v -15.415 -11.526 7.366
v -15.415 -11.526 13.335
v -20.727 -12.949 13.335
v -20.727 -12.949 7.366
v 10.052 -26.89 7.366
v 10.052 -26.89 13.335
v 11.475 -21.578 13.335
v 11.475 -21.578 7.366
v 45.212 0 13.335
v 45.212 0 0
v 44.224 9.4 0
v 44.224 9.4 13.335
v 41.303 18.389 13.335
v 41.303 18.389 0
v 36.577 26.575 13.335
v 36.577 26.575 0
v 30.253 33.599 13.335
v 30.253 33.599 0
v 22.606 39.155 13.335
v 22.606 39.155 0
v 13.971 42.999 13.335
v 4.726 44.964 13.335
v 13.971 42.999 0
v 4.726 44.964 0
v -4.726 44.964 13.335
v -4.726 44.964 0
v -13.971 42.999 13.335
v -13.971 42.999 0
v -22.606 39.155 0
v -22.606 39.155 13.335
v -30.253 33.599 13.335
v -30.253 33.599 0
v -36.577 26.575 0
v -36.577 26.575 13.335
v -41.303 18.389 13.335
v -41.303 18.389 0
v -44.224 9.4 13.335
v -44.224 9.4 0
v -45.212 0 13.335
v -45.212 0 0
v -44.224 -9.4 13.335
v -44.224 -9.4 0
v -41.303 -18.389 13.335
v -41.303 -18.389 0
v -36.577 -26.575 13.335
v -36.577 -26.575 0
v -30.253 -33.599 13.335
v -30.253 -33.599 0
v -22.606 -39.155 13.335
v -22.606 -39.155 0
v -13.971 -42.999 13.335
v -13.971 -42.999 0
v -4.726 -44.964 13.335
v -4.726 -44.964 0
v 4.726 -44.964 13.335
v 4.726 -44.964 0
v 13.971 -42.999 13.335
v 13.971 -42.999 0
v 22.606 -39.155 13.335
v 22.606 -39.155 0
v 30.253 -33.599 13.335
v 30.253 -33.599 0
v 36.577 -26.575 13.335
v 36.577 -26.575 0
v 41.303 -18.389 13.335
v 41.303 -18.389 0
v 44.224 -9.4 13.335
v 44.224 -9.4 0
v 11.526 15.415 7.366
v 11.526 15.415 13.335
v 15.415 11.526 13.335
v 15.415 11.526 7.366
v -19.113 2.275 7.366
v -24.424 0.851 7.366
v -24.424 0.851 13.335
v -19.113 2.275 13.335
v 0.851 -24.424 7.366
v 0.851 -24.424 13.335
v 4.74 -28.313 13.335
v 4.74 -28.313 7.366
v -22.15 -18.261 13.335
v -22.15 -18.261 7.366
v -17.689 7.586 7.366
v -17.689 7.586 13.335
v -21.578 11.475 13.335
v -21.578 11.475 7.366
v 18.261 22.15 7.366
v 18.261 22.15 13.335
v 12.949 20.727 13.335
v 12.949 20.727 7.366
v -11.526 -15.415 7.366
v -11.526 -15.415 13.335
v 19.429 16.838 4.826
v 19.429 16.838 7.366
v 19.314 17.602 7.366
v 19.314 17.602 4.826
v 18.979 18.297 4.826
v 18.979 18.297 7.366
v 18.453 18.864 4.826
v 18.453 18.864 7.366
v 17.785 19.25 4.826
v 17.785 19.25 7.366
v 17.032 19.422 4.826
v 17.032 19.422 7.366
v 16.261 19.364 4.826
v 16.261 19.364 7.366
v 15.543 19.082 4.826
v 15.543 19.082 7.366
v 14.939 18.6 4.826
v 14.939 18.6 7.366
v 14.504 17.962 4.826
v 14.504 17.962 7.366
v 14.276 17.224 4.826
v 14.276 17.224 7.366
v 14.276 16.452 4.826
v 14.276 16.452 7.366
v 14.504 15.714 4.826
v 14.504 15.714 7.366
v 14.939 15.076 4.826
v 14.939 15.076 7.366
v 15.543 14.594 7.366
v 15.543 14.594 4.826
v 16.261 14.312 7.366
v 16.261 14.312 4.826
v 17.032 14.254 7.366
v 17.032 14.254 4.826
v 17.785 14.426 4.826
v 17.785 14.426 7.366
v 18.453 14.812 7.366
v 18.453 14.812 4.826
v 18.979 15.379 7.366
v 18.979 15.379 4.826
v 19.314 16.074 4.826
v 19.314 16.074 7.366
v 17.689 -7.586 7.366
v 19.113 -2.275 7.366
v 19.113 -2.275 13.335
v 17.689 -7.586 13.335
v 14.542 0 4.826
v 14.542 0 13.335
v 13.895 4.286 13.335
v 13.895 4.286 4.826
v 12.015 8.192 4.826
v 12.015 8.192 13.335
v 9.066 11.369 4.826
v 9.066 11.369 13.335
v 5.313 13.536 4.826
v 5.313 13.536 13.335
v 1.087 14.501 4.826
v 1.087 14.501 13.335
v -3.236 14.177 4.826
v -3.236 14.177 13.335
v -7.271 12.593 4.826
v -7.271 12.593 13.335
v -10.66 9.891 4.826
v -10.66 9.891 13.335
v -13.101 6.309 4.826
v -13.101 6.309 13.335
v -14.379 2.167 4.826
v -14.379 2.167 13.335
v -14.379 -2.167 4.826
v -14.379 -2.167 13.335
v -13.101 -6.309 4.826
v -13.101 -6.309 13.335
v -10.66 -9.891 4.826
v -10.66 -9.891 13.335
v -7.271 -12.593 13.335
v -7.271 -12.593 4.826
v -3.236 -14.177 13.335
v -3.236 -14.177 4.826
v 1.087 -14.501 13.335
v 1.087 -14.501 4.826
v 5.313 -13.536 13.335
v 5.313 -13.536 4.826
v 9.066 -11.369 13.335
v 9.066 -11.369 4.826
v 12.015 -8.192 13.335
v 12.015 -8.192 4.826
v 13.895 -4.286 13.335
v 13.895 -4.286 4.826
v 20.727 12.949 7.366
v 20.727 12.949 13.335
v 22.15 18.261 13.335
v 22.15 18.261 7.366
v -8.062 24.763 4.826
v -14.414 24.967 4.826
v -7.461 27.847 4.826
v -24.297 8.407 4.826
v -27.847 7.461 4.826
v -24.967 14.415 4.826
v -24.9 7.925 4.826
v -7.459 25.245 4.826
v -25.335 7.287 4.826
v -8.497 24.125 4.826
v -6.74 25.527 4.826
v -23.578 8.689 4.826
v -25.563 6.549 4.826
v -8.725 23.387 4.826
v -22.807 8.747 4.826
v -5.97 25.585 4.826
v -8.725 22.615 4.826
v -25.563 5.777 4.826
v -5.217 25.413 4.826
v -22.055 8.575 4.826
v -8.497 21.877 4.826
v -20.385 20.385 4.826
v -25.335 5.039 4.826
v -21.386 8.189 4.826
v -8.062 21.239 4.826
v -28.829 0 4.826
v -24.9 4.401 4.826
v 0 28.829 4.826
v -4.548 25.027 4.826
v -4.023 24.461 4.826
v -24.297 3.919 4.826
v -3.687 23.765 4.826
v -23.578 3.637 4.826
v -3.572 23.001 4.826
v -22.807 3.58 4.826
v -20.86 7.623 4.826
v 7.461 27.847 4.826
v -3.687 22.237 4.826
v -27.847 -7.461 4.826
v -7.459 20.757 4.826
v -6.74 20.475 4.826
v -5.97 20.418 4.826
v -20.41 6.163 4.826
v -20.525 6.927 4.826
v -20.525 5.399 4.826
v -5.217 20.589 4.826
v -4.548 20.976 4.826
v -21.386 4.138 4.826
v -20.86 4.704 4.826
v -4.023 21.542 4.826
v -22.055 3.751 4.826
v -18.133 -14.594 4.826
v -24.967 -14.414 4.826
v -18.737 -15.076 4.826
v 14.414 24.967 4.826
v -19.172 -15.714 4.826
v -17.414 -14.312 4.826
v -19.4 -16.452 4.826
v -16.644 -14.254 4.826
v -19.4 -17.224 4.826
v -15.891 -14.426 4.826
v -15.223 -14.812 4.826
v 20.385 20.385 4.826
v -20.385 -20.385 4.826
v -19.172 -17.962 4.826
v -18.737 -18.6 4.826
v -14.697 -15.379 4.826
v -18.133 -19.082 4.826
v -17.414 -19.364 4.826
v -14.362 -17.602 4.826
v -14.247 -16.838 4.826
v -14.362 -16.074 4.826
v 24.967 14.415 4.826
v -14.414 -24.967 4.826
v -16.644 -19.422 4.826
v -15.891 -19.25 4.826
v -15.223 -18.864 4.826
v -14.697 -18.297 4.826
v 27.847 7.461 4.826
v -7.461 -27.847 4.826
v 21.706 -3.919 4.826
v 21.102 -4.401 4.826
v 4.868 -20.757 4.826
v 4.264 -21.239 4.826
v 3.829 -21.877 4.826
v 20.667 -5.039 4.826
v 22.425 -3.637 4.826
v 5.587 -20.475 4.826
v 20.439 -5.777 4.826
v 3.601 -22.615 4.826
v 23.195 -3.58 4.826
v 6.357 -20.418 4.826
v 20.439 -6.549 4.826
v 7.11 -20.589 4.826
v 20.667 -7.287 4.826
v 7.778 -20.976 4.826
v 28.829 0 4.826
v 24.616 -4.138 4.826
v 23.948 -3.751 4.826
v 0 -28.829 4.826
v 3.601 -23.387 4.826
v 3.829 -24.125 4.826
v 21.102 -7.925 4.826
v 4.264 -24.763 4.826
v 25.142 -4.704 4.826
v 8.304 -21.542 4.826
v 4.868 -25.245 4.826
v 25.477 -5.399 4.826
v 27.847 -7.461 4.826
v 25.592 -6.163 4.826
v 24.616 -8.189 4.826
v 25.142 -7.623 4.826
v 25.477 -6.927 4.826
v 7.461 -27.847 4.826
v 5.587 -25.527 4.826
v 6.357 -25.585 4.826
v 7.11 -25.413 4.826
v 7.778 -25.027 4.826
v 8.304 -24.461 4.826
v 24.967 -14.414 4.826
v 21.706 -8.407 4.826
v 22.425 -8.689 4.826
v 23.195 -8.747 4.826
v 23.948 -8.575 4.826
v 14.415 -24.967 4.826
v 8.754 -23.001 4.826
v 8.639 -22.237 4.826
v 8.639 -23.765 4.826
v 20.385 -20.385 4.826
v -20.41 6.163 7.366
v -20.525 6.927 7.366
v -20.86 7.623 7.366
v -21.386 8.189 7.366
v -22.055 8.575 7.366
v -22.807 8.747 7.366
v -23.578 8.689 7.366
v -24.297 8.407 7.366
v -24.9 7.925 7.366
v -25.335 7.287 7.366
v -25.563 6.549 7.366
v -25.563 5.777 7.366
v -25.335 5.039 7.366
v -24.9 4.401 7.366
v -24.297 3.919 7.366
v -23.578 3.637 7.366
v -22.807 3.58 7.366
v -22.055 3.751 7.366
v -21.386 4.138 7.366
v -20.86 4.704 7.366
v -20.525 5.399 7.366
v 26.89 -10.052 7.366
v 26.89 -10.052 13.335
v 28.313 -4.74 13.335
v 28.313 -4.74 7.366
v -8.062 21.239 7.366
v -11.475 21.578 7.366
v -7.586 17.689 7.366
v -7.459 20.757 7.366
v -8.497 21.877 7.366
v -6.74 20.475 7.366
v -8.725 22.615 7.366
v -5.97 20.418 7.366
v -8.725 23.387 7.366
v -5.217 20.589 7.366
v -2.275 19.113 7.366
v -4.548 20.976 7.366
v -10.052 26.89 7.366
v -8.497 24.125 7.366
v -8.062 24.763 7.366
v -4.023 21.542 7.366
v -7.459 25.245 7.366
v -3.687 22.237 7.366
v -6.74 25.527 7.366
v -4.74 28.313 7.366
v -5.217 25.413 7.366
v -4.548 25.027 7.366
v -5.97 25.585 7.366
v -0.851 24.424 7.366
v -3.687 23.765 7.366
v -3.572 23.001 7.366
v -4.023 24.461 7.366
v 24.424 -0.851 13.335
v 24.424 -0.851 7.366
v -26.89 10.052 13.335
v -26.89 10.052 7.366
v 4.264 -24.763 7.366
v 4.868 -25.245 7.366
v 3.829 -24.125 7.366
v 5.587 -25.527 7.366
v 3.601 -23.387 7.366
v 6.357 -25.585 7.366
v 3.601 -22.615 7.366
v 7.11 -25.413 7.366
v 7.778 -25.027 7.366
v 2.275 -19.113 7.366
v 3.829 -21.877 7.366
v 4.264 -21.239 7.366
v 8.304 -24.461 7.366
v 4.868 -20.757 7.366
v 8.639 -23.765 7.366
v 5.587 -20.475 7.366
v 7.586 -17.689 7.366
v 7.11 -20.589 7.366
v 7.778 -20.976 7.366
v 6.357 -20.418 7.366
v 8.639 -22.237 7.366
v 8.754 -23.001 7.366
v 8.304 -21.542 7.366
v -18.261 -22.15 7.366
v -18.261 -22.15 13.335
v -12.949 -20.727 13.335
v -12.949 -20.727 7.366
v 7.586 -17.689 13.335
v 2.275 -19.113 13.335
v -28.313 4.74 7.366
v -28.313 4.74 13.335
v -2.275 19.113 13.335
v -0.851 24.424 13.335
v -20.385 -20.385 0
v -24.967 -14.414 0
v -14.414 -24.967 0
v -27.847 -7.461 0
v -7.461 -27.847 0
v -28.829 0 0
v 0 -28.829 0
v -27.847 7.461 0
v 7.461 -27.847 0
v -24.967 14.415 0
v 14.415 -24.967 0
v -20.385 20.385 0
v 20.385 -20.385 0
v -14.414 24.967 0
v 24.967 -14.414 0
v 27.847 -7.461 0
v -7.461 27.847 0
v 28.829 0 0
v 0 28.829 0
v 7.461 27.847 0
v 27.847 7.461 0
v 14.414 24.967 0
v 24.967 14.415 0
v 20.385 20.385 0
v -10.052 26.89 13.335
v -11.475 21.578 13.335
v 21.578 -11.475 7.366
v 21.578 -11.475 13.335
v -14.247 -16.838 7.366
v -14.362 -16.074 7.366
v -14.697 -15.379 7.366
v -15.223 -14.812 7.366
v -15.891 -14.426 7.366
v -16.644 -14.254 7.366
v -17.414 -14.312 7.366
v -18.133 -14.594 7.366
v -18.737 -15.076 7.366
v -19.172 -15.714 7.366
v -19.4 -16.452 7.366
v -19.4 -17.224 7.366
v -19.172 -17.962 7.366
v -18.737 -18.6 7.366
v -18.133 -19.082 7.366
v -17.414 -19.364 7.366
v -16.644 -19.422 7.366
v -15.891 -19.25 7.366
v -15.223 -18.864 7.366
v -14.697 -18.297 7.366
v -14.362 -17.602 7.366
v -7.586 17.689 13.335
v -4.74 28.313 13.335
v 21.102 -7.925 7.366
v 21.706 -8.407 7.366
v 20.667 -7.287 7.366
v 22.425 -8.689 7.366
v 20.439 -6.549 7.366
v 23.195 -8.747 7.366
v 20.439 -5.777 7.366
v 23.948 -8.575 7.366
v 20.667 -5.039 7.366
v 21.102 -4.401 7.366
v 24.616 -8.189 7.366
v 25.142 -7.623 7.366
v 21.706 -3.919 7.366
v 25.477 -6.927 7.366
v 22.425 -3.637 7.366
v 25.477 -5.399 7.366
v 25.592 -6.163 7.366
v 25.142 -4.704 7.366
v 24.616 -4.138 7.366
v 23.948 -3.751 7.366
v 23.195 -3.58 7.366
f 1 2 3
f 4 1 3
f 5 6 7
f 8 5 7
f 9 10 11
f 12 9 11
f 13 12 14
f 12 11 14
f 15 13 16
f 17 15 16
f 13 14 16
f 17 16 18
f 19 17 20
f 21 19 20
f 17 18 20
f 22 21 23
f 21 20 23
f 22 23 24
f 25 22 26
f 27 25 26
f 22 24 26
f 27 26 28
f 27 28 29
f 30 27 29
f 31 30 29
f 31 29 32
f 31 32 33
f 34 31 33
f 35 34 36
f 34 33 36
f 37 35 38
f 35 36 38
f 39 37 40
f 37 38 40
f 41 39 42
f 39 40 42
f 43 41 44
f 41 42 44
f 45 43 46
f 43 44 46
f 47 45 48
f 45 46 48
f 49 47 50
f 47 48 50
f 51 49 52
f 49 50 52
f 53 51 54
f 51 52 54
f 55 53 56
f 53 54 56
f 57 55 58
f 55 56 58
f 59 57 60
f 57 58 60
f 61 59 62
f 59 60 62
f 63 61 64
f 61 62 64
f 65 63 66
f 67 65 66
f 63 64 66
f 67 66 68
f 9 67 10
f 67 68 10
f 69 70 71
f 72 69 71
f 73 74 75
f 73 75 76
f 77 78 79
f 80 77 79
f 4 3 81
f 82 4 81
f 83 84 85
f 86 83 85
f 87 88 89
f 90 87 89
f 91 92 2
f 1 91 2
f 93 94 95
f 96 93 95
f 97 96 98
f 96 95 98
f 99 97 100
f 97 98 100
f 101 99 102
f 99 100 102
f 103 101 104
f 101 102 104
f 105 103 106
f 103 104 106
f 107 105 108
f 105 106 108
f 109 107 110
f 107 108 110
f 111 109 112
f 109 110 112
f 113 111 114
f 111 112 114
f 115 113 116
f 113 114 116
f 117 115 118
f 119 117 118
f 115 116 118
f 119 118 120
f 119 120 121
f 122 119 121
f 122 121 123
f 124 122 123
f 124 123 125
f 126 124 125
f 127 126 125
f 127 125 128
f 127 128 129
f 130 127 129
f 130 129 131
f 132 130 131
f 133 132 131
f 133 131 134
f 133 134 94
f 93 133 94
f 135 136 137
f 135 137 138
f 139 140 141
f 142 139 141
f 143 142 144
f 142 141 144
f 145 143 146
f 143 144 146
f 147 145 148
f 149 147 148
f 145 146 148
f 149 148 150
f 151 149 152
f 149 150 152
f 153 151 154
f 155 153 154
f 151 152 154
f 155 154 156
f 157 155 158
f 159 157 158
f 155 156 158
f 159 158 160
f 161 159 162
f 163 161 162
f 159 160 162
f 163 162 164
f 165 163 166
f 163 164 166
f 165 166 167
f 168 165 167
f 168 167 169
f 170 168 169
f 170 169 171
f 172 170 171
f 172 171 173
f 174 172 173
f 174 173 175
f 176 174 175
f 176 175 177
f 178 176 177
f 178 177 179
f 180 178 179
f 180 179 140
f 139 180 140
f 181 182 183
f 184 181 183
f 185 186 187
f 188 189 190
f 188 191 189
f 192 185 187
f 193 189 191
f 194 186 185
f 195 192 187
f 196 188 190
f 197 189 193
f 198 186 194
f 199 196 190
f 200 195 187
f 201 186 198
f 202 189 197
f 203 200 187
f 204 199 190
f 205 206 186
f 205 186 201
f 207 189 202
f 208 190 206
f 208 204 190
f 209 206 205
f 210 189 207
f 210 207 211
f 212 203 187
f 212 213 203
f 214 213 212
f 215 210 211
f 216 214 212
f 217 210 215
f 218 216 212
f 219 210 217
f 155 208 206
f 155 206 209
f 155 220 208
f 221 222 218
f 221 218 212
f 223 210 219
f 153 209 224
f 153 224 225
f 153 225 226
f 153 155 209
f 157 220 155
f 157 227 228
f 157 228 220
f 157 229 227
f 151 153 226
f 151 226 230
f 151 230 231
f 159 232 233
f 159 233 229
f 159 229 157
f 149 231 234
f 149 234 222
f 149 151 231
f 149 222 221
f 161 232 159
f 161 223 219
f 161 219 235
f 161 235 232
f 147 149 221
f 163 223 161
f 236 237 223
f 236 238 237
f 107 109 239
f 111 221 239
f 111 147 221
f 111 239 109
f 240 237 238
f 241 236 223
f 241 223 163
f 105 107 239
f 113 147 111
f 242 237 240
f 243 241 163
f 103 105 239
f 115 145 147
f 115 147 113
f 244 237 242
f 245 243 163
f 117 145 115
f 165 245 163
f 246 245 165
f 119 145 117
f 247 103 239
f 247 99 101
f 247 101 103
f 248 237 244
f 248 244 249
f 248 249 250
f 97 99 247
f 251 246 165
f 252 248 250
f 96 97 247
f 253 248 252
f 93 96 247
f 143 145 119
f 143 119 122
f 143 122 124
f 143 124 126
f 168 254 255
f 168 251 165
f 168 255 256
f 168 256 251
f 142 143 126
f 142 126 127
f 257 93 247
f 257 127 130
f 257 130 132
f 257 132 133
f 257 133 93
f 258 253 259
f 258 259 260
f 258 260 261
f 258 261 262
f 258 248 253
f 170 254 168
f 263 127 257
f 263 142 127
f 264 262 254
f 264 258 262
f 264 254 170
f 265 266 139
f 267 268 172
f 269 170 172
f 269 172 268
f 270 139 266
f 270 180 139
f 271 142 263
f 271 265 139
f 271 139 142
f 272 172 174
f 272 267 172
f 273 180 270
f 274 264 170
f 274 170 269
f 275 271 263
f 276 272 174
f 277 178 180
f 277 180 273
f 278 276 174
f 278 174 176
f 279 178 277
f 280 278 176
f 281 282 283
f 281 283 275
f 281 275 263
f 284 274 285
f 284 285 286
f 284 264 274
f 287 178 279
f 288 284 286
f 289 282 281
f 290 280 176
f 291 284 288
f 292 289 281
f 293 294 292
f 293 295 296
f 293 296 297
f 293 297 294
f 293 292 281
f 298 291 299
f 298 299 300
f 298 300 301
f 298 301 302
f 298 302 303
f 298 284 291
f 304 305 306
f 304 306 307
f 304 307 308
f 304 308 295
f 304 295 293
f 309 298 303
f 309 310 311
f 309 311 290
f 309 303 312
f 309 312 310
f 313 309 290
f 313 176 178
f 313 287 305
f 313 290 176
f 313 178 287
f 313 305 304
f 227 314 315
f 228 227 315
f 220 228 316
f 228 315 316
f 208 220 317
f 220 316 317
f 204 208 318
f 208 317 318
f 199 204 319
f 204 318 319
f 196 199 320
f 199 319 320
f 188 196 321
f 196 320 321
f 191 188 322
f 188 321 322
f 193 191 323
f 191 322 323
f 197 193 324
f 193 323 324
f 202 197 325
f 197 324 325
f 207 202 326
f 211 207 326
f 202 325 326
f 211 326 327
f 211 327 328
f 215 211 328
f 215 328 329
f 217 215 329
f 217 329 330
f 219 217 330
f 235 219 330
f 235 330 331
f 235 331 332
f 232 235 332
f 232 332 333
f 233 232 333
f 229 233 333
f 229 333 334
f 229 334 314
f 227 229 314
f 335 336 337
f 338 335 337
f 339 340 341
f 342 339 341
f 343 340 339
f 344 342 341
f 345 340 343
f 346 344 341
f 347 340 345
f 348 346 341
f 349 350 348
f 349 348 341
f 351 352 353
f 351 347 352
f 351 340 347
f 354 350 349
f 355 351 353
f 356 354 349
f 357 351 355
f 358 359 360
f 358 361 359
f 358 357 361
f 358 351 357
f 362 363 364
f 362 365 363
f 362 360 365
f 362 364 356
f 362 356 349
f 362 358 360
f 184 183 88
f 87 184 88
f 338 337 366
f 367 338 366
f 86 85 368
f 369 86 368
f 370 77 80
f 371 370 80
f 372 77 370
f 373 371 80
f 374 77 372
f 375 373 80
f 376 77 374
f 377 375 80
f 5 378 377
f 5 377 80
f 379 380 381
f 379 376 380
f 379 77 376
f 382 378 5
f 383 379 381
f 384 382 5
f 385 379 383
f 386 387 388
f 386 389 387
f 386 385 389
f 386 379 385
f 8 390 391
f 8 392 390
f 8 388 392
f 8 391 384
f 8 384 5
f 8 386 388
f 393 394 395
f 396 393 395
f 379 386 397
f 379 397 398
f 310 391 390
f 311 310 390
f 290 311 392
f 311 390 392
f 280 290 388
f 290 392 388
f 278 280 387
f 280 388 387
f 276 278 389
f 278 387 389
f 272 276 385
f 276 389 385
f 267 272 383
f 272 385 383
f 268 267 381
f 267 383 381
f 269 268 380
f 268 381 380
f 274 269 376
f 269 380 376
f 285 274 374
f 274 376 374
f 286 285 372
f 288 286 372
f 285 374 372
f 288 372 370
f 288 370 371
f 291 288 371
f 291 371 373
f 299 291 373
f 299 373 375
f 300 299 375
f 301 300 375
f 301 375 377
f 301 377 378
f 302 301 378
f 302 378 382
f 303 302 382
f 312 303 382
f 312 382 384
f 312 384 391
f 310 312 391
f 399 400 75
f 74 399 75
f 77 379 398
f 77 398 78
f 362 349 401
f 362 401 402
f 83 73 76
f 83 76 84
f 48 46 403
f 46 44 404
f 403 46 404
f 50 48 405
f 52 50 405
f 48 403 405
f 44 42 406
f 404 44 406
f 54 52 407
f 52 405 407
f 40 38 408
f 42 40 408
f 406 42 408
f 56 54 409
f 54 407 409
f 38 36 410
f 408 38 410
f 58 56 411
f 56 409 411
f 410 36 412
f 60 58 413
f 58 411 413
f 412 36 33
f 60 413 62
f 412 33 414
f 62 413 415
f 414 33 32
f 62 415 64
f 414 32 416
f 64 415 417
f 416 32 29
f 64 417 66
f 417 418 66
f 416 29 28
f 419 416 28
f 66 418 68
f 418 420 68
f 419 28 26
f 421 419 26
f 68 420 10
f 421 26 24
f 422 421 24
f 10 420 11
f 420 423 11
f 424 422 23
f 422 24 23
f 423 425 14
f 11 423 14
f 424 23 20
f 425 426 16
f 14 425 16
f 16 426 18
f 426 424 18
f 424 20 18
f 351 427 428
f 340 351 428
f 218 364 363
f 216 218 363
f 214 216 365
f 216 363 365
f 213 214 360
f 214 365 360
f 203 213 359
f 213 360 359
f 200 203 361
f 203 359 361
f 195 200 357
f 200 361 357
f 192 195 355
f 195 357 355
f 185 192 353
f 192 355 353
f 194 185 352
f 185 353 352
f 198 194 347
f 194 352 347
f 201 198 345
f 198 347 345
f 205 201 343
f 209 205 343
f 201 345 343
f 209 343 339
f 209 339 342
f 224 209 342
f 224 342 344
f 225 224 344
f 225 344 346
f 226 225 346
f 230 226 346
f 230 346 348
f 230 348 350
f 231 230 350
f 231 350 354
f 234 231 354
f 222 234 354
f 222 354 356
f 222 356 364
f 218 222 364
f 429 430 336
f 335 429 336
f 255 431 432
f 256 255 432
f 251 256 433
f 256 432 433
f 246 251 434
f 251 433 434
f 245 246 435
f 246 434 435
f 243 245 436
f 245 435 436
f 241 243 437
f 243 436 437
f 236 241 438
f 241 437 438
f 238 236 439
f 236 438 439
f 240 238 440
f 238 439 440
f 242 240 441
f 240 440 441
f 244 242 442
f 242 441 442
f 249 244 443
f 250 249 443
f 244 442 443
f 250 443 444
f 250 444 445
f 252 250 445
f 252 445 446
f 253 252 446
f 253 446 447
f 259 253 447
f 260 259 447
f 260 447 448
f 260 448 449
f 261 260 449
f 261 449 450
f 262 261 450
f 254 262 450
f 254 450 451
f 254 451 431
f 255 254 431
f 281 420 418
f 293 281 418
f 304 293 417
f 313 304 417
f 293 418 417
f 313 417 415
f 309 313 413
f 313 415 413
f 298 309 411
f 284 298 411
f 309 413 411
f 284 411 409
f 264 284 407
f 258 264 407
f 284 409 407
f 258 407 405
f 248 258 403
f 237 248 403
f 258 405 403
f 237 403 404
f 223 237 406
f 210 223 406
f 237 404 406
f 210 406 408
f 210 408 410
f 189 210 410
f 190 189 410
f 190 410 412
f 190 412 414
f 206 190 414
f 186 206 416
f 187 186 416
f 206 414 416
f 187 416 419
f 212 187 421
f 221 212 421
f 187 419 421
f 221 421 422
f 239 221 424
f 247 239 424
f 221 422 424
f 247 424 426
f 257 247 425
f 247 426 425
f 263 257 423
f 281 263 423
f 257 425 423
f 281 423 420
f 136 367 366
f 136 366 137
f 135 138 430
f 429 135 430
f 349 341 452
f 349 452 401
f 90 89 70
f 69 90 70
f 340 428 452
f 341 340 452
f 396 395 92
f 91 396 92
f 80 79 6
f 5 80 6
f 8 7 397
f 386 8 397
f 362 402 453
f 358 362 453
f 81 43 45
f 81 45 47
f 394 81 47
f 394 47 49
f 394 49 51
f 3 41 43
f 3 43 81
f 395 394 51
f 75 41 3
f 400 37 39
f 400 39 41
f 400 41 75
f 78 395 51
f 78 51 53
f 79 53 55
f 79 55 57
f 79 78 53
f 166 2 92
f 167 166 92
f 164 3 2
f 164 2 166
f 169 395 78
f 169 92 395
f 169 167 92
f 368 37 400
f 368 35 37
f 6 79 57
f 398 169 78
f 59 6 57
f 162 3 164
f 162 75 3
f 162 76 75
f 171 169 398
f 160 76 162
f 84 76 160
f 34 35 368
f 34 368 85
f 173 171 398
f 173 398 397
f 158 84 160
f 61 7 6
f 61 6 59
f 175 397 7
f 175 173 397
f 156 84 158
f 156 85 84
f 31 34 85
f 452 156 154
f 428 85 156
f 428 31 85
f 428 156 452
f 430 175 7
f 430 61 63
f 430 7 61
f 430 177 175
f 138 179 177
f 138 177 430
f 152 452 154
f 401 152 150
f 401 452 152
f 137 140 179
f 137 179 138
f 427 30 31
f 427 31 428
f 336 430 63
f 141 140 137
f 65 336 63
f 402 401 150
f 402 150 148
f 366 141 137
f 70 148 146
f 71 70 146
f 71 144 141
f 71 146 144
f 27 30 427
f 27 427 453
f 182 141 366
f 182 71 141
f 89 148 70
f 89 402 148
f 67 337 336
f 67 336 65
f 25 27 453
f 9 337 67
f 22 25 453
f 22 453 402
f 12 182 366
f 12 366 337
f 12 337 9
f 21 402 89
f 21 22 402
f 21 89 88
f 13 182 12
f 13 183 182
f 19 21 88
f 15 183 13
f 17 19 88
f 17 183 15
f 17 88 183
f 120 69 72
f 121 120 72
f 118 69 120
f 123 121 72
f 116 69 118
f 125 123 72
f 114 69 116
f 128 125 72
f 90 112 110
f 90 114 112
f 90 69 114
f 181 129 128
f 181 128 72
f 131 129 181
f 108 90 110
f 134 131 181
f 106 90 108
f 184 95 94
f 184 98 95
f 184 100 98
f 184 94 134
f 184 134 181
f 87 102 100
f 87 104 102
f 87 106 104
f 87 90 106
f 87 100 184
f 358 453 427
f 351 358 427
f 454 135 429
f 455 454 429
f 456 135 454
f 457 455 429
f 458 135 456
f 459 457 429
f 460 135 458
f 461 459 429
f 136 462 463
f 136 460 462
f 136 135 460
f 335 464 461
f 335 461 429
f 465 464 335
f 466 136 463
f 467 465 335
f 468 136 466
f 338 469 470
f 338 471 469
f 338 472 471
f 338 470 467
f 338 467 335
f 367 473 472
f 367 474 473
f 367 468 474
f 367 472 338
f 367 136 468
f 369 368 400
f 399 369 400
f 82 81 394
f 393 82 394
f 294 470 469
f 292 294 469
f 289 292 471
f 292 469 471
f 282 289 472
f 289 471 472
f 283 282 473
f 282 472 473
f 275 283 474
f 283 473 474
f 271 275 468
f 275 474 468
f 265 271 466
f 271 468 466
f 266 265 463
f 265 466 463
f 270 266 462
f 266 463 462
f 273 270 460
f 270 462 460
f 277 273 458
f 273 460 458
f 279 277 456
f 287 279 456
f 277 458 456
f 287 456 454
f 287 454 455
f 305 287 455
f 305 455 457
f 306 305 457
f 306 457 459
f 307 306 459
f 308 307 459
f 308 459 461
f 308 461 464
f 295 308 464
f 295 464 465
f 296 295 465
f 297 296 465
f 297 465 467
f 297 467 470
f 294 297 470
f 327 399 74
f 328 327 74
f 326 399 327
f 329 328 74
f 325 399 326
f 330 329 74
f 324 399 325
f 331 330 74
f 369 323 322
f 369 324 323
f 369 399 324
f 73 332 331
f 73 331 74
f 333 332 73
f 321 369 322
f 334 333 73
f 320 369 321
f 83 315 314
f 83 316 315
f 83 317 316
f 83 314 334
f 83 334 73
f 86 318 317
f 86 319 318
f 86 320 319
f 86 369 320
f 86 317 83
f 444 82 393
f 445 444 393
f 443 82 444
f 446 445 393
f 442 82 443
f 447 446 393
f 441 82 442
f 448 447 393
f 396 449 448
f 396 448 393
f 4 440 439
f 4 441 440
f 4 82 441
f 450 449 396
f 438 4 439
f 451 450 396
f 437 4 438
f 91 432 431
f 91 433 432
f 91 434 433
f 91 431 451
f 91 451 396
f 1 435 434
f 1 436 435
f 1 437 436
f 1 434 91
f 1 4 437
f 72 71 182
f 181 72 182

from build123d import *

# Parameters (mm, degrees)
F0_R     = 45.212
F1_DEPTH = 13.335
F2_R     = 2.5908
F3_DEPTH = 25.4
F4_R     = 14.5415
F5_DEPTH = 25.4
F7_DEPTH = 5.969
F8_R     = 28.829
F9_DEPTH = 4.826


with BuildPart() as f1:
    # F0 (on Top) → F1 (new body)
    with BuildSketch(Plane.XY):
        Circle(F0_R)
    extrude(amount=F1_DEPTH)

    # F2 (on face) → F3 (cut)
    with BuildSketch(Plane.XY.offset(13.335)):
        with Locations((-6.163129, 23.001109)):
            Circle(F2_R)
        with Locations((-23.001109, 6.163129)):
            Circle(F2_R)
        with Locations((-16.83798, -16.83798)):
            Circle(F2_R)
        with Locations((6.163129, -23.001109)):
            Circle(F2_R)
        with Locations((23.001109, -6.163129)):
            Circle(F2_R)
        with Locations((16.83798, 16.83798)):
            Circle(F2_R)
    extrude(amount=-F3_DEPTH, mode=Mode.SUBTRACT)

    # F4 (on face) → F5 (cut)
    with BuildSketch(Plane.XY.offset(13.335)):
        Circle(F4_R)
    extrude(amount=-F5_DEPTH, mode=Mode.SUBTRACT)

    # F6 (on face) → F7 (cut)
    with BuildSketch(Plane.XY.offset(13.335)):
        Polygon((-4.739815, 28.312987), (-10.051693, 26.889674), (-11.475007, 21.577795), (-7.586442, 17.68923), (-2.274564, 19.112544), (-0.85125, 24.424422), align=None)
        Polygon((22.149859, 18.261294), (18.261294, 22.149859), (12.949415, 20.726545), (11.526102, 15.414667), (15.414667, 11.526102), (20.726545, 12.949415), align=None)
        Polygon((26.889674, -10.051693), (28.312987, -4.739815), (24.424422, -0.85125), (19.112544, -2.274564), (17.68923, -7.586442), (21.577795, -11.475007), align=None)
        Polygon((4.739815, -28.312987), (10.051693, -26.889674), (11.475007, -21.577795), (7.586442, -17.68923), (2.274564, -19.112544), (0.85125, -24.424422), align=None)
        Polygon((-22.149859, -18.261294), (-18.261294, -22.149859), (-12.949415, -20.726545), (-11.526102, -15.414667), (-15.414667, -11.526102), (-20.726545, -12.949415), align=None)
        Polygon((-26.889674, 10.051693), (-28.312987, 4.739815), (-24.424422, 0.85125), (-19.112544, 2.274564), (-17.68923, 7.586442), (-21.577795, 11.475007), align=None)
    extrude(amount=-F7_DEPTH, mode=Mode.SUBTRACT)

    # F8 (on face) → F9 (cut)
    with BuildSketch(Plane(origin=(0, 0, 0), x_dir=(1, 0, 0), z_dir=(0, 0, -1))):
        Circle(F8_R)
    extrude(amount=-F9_DEPTH, mode=Mode.SUBTRACT)


solid = f1.part
